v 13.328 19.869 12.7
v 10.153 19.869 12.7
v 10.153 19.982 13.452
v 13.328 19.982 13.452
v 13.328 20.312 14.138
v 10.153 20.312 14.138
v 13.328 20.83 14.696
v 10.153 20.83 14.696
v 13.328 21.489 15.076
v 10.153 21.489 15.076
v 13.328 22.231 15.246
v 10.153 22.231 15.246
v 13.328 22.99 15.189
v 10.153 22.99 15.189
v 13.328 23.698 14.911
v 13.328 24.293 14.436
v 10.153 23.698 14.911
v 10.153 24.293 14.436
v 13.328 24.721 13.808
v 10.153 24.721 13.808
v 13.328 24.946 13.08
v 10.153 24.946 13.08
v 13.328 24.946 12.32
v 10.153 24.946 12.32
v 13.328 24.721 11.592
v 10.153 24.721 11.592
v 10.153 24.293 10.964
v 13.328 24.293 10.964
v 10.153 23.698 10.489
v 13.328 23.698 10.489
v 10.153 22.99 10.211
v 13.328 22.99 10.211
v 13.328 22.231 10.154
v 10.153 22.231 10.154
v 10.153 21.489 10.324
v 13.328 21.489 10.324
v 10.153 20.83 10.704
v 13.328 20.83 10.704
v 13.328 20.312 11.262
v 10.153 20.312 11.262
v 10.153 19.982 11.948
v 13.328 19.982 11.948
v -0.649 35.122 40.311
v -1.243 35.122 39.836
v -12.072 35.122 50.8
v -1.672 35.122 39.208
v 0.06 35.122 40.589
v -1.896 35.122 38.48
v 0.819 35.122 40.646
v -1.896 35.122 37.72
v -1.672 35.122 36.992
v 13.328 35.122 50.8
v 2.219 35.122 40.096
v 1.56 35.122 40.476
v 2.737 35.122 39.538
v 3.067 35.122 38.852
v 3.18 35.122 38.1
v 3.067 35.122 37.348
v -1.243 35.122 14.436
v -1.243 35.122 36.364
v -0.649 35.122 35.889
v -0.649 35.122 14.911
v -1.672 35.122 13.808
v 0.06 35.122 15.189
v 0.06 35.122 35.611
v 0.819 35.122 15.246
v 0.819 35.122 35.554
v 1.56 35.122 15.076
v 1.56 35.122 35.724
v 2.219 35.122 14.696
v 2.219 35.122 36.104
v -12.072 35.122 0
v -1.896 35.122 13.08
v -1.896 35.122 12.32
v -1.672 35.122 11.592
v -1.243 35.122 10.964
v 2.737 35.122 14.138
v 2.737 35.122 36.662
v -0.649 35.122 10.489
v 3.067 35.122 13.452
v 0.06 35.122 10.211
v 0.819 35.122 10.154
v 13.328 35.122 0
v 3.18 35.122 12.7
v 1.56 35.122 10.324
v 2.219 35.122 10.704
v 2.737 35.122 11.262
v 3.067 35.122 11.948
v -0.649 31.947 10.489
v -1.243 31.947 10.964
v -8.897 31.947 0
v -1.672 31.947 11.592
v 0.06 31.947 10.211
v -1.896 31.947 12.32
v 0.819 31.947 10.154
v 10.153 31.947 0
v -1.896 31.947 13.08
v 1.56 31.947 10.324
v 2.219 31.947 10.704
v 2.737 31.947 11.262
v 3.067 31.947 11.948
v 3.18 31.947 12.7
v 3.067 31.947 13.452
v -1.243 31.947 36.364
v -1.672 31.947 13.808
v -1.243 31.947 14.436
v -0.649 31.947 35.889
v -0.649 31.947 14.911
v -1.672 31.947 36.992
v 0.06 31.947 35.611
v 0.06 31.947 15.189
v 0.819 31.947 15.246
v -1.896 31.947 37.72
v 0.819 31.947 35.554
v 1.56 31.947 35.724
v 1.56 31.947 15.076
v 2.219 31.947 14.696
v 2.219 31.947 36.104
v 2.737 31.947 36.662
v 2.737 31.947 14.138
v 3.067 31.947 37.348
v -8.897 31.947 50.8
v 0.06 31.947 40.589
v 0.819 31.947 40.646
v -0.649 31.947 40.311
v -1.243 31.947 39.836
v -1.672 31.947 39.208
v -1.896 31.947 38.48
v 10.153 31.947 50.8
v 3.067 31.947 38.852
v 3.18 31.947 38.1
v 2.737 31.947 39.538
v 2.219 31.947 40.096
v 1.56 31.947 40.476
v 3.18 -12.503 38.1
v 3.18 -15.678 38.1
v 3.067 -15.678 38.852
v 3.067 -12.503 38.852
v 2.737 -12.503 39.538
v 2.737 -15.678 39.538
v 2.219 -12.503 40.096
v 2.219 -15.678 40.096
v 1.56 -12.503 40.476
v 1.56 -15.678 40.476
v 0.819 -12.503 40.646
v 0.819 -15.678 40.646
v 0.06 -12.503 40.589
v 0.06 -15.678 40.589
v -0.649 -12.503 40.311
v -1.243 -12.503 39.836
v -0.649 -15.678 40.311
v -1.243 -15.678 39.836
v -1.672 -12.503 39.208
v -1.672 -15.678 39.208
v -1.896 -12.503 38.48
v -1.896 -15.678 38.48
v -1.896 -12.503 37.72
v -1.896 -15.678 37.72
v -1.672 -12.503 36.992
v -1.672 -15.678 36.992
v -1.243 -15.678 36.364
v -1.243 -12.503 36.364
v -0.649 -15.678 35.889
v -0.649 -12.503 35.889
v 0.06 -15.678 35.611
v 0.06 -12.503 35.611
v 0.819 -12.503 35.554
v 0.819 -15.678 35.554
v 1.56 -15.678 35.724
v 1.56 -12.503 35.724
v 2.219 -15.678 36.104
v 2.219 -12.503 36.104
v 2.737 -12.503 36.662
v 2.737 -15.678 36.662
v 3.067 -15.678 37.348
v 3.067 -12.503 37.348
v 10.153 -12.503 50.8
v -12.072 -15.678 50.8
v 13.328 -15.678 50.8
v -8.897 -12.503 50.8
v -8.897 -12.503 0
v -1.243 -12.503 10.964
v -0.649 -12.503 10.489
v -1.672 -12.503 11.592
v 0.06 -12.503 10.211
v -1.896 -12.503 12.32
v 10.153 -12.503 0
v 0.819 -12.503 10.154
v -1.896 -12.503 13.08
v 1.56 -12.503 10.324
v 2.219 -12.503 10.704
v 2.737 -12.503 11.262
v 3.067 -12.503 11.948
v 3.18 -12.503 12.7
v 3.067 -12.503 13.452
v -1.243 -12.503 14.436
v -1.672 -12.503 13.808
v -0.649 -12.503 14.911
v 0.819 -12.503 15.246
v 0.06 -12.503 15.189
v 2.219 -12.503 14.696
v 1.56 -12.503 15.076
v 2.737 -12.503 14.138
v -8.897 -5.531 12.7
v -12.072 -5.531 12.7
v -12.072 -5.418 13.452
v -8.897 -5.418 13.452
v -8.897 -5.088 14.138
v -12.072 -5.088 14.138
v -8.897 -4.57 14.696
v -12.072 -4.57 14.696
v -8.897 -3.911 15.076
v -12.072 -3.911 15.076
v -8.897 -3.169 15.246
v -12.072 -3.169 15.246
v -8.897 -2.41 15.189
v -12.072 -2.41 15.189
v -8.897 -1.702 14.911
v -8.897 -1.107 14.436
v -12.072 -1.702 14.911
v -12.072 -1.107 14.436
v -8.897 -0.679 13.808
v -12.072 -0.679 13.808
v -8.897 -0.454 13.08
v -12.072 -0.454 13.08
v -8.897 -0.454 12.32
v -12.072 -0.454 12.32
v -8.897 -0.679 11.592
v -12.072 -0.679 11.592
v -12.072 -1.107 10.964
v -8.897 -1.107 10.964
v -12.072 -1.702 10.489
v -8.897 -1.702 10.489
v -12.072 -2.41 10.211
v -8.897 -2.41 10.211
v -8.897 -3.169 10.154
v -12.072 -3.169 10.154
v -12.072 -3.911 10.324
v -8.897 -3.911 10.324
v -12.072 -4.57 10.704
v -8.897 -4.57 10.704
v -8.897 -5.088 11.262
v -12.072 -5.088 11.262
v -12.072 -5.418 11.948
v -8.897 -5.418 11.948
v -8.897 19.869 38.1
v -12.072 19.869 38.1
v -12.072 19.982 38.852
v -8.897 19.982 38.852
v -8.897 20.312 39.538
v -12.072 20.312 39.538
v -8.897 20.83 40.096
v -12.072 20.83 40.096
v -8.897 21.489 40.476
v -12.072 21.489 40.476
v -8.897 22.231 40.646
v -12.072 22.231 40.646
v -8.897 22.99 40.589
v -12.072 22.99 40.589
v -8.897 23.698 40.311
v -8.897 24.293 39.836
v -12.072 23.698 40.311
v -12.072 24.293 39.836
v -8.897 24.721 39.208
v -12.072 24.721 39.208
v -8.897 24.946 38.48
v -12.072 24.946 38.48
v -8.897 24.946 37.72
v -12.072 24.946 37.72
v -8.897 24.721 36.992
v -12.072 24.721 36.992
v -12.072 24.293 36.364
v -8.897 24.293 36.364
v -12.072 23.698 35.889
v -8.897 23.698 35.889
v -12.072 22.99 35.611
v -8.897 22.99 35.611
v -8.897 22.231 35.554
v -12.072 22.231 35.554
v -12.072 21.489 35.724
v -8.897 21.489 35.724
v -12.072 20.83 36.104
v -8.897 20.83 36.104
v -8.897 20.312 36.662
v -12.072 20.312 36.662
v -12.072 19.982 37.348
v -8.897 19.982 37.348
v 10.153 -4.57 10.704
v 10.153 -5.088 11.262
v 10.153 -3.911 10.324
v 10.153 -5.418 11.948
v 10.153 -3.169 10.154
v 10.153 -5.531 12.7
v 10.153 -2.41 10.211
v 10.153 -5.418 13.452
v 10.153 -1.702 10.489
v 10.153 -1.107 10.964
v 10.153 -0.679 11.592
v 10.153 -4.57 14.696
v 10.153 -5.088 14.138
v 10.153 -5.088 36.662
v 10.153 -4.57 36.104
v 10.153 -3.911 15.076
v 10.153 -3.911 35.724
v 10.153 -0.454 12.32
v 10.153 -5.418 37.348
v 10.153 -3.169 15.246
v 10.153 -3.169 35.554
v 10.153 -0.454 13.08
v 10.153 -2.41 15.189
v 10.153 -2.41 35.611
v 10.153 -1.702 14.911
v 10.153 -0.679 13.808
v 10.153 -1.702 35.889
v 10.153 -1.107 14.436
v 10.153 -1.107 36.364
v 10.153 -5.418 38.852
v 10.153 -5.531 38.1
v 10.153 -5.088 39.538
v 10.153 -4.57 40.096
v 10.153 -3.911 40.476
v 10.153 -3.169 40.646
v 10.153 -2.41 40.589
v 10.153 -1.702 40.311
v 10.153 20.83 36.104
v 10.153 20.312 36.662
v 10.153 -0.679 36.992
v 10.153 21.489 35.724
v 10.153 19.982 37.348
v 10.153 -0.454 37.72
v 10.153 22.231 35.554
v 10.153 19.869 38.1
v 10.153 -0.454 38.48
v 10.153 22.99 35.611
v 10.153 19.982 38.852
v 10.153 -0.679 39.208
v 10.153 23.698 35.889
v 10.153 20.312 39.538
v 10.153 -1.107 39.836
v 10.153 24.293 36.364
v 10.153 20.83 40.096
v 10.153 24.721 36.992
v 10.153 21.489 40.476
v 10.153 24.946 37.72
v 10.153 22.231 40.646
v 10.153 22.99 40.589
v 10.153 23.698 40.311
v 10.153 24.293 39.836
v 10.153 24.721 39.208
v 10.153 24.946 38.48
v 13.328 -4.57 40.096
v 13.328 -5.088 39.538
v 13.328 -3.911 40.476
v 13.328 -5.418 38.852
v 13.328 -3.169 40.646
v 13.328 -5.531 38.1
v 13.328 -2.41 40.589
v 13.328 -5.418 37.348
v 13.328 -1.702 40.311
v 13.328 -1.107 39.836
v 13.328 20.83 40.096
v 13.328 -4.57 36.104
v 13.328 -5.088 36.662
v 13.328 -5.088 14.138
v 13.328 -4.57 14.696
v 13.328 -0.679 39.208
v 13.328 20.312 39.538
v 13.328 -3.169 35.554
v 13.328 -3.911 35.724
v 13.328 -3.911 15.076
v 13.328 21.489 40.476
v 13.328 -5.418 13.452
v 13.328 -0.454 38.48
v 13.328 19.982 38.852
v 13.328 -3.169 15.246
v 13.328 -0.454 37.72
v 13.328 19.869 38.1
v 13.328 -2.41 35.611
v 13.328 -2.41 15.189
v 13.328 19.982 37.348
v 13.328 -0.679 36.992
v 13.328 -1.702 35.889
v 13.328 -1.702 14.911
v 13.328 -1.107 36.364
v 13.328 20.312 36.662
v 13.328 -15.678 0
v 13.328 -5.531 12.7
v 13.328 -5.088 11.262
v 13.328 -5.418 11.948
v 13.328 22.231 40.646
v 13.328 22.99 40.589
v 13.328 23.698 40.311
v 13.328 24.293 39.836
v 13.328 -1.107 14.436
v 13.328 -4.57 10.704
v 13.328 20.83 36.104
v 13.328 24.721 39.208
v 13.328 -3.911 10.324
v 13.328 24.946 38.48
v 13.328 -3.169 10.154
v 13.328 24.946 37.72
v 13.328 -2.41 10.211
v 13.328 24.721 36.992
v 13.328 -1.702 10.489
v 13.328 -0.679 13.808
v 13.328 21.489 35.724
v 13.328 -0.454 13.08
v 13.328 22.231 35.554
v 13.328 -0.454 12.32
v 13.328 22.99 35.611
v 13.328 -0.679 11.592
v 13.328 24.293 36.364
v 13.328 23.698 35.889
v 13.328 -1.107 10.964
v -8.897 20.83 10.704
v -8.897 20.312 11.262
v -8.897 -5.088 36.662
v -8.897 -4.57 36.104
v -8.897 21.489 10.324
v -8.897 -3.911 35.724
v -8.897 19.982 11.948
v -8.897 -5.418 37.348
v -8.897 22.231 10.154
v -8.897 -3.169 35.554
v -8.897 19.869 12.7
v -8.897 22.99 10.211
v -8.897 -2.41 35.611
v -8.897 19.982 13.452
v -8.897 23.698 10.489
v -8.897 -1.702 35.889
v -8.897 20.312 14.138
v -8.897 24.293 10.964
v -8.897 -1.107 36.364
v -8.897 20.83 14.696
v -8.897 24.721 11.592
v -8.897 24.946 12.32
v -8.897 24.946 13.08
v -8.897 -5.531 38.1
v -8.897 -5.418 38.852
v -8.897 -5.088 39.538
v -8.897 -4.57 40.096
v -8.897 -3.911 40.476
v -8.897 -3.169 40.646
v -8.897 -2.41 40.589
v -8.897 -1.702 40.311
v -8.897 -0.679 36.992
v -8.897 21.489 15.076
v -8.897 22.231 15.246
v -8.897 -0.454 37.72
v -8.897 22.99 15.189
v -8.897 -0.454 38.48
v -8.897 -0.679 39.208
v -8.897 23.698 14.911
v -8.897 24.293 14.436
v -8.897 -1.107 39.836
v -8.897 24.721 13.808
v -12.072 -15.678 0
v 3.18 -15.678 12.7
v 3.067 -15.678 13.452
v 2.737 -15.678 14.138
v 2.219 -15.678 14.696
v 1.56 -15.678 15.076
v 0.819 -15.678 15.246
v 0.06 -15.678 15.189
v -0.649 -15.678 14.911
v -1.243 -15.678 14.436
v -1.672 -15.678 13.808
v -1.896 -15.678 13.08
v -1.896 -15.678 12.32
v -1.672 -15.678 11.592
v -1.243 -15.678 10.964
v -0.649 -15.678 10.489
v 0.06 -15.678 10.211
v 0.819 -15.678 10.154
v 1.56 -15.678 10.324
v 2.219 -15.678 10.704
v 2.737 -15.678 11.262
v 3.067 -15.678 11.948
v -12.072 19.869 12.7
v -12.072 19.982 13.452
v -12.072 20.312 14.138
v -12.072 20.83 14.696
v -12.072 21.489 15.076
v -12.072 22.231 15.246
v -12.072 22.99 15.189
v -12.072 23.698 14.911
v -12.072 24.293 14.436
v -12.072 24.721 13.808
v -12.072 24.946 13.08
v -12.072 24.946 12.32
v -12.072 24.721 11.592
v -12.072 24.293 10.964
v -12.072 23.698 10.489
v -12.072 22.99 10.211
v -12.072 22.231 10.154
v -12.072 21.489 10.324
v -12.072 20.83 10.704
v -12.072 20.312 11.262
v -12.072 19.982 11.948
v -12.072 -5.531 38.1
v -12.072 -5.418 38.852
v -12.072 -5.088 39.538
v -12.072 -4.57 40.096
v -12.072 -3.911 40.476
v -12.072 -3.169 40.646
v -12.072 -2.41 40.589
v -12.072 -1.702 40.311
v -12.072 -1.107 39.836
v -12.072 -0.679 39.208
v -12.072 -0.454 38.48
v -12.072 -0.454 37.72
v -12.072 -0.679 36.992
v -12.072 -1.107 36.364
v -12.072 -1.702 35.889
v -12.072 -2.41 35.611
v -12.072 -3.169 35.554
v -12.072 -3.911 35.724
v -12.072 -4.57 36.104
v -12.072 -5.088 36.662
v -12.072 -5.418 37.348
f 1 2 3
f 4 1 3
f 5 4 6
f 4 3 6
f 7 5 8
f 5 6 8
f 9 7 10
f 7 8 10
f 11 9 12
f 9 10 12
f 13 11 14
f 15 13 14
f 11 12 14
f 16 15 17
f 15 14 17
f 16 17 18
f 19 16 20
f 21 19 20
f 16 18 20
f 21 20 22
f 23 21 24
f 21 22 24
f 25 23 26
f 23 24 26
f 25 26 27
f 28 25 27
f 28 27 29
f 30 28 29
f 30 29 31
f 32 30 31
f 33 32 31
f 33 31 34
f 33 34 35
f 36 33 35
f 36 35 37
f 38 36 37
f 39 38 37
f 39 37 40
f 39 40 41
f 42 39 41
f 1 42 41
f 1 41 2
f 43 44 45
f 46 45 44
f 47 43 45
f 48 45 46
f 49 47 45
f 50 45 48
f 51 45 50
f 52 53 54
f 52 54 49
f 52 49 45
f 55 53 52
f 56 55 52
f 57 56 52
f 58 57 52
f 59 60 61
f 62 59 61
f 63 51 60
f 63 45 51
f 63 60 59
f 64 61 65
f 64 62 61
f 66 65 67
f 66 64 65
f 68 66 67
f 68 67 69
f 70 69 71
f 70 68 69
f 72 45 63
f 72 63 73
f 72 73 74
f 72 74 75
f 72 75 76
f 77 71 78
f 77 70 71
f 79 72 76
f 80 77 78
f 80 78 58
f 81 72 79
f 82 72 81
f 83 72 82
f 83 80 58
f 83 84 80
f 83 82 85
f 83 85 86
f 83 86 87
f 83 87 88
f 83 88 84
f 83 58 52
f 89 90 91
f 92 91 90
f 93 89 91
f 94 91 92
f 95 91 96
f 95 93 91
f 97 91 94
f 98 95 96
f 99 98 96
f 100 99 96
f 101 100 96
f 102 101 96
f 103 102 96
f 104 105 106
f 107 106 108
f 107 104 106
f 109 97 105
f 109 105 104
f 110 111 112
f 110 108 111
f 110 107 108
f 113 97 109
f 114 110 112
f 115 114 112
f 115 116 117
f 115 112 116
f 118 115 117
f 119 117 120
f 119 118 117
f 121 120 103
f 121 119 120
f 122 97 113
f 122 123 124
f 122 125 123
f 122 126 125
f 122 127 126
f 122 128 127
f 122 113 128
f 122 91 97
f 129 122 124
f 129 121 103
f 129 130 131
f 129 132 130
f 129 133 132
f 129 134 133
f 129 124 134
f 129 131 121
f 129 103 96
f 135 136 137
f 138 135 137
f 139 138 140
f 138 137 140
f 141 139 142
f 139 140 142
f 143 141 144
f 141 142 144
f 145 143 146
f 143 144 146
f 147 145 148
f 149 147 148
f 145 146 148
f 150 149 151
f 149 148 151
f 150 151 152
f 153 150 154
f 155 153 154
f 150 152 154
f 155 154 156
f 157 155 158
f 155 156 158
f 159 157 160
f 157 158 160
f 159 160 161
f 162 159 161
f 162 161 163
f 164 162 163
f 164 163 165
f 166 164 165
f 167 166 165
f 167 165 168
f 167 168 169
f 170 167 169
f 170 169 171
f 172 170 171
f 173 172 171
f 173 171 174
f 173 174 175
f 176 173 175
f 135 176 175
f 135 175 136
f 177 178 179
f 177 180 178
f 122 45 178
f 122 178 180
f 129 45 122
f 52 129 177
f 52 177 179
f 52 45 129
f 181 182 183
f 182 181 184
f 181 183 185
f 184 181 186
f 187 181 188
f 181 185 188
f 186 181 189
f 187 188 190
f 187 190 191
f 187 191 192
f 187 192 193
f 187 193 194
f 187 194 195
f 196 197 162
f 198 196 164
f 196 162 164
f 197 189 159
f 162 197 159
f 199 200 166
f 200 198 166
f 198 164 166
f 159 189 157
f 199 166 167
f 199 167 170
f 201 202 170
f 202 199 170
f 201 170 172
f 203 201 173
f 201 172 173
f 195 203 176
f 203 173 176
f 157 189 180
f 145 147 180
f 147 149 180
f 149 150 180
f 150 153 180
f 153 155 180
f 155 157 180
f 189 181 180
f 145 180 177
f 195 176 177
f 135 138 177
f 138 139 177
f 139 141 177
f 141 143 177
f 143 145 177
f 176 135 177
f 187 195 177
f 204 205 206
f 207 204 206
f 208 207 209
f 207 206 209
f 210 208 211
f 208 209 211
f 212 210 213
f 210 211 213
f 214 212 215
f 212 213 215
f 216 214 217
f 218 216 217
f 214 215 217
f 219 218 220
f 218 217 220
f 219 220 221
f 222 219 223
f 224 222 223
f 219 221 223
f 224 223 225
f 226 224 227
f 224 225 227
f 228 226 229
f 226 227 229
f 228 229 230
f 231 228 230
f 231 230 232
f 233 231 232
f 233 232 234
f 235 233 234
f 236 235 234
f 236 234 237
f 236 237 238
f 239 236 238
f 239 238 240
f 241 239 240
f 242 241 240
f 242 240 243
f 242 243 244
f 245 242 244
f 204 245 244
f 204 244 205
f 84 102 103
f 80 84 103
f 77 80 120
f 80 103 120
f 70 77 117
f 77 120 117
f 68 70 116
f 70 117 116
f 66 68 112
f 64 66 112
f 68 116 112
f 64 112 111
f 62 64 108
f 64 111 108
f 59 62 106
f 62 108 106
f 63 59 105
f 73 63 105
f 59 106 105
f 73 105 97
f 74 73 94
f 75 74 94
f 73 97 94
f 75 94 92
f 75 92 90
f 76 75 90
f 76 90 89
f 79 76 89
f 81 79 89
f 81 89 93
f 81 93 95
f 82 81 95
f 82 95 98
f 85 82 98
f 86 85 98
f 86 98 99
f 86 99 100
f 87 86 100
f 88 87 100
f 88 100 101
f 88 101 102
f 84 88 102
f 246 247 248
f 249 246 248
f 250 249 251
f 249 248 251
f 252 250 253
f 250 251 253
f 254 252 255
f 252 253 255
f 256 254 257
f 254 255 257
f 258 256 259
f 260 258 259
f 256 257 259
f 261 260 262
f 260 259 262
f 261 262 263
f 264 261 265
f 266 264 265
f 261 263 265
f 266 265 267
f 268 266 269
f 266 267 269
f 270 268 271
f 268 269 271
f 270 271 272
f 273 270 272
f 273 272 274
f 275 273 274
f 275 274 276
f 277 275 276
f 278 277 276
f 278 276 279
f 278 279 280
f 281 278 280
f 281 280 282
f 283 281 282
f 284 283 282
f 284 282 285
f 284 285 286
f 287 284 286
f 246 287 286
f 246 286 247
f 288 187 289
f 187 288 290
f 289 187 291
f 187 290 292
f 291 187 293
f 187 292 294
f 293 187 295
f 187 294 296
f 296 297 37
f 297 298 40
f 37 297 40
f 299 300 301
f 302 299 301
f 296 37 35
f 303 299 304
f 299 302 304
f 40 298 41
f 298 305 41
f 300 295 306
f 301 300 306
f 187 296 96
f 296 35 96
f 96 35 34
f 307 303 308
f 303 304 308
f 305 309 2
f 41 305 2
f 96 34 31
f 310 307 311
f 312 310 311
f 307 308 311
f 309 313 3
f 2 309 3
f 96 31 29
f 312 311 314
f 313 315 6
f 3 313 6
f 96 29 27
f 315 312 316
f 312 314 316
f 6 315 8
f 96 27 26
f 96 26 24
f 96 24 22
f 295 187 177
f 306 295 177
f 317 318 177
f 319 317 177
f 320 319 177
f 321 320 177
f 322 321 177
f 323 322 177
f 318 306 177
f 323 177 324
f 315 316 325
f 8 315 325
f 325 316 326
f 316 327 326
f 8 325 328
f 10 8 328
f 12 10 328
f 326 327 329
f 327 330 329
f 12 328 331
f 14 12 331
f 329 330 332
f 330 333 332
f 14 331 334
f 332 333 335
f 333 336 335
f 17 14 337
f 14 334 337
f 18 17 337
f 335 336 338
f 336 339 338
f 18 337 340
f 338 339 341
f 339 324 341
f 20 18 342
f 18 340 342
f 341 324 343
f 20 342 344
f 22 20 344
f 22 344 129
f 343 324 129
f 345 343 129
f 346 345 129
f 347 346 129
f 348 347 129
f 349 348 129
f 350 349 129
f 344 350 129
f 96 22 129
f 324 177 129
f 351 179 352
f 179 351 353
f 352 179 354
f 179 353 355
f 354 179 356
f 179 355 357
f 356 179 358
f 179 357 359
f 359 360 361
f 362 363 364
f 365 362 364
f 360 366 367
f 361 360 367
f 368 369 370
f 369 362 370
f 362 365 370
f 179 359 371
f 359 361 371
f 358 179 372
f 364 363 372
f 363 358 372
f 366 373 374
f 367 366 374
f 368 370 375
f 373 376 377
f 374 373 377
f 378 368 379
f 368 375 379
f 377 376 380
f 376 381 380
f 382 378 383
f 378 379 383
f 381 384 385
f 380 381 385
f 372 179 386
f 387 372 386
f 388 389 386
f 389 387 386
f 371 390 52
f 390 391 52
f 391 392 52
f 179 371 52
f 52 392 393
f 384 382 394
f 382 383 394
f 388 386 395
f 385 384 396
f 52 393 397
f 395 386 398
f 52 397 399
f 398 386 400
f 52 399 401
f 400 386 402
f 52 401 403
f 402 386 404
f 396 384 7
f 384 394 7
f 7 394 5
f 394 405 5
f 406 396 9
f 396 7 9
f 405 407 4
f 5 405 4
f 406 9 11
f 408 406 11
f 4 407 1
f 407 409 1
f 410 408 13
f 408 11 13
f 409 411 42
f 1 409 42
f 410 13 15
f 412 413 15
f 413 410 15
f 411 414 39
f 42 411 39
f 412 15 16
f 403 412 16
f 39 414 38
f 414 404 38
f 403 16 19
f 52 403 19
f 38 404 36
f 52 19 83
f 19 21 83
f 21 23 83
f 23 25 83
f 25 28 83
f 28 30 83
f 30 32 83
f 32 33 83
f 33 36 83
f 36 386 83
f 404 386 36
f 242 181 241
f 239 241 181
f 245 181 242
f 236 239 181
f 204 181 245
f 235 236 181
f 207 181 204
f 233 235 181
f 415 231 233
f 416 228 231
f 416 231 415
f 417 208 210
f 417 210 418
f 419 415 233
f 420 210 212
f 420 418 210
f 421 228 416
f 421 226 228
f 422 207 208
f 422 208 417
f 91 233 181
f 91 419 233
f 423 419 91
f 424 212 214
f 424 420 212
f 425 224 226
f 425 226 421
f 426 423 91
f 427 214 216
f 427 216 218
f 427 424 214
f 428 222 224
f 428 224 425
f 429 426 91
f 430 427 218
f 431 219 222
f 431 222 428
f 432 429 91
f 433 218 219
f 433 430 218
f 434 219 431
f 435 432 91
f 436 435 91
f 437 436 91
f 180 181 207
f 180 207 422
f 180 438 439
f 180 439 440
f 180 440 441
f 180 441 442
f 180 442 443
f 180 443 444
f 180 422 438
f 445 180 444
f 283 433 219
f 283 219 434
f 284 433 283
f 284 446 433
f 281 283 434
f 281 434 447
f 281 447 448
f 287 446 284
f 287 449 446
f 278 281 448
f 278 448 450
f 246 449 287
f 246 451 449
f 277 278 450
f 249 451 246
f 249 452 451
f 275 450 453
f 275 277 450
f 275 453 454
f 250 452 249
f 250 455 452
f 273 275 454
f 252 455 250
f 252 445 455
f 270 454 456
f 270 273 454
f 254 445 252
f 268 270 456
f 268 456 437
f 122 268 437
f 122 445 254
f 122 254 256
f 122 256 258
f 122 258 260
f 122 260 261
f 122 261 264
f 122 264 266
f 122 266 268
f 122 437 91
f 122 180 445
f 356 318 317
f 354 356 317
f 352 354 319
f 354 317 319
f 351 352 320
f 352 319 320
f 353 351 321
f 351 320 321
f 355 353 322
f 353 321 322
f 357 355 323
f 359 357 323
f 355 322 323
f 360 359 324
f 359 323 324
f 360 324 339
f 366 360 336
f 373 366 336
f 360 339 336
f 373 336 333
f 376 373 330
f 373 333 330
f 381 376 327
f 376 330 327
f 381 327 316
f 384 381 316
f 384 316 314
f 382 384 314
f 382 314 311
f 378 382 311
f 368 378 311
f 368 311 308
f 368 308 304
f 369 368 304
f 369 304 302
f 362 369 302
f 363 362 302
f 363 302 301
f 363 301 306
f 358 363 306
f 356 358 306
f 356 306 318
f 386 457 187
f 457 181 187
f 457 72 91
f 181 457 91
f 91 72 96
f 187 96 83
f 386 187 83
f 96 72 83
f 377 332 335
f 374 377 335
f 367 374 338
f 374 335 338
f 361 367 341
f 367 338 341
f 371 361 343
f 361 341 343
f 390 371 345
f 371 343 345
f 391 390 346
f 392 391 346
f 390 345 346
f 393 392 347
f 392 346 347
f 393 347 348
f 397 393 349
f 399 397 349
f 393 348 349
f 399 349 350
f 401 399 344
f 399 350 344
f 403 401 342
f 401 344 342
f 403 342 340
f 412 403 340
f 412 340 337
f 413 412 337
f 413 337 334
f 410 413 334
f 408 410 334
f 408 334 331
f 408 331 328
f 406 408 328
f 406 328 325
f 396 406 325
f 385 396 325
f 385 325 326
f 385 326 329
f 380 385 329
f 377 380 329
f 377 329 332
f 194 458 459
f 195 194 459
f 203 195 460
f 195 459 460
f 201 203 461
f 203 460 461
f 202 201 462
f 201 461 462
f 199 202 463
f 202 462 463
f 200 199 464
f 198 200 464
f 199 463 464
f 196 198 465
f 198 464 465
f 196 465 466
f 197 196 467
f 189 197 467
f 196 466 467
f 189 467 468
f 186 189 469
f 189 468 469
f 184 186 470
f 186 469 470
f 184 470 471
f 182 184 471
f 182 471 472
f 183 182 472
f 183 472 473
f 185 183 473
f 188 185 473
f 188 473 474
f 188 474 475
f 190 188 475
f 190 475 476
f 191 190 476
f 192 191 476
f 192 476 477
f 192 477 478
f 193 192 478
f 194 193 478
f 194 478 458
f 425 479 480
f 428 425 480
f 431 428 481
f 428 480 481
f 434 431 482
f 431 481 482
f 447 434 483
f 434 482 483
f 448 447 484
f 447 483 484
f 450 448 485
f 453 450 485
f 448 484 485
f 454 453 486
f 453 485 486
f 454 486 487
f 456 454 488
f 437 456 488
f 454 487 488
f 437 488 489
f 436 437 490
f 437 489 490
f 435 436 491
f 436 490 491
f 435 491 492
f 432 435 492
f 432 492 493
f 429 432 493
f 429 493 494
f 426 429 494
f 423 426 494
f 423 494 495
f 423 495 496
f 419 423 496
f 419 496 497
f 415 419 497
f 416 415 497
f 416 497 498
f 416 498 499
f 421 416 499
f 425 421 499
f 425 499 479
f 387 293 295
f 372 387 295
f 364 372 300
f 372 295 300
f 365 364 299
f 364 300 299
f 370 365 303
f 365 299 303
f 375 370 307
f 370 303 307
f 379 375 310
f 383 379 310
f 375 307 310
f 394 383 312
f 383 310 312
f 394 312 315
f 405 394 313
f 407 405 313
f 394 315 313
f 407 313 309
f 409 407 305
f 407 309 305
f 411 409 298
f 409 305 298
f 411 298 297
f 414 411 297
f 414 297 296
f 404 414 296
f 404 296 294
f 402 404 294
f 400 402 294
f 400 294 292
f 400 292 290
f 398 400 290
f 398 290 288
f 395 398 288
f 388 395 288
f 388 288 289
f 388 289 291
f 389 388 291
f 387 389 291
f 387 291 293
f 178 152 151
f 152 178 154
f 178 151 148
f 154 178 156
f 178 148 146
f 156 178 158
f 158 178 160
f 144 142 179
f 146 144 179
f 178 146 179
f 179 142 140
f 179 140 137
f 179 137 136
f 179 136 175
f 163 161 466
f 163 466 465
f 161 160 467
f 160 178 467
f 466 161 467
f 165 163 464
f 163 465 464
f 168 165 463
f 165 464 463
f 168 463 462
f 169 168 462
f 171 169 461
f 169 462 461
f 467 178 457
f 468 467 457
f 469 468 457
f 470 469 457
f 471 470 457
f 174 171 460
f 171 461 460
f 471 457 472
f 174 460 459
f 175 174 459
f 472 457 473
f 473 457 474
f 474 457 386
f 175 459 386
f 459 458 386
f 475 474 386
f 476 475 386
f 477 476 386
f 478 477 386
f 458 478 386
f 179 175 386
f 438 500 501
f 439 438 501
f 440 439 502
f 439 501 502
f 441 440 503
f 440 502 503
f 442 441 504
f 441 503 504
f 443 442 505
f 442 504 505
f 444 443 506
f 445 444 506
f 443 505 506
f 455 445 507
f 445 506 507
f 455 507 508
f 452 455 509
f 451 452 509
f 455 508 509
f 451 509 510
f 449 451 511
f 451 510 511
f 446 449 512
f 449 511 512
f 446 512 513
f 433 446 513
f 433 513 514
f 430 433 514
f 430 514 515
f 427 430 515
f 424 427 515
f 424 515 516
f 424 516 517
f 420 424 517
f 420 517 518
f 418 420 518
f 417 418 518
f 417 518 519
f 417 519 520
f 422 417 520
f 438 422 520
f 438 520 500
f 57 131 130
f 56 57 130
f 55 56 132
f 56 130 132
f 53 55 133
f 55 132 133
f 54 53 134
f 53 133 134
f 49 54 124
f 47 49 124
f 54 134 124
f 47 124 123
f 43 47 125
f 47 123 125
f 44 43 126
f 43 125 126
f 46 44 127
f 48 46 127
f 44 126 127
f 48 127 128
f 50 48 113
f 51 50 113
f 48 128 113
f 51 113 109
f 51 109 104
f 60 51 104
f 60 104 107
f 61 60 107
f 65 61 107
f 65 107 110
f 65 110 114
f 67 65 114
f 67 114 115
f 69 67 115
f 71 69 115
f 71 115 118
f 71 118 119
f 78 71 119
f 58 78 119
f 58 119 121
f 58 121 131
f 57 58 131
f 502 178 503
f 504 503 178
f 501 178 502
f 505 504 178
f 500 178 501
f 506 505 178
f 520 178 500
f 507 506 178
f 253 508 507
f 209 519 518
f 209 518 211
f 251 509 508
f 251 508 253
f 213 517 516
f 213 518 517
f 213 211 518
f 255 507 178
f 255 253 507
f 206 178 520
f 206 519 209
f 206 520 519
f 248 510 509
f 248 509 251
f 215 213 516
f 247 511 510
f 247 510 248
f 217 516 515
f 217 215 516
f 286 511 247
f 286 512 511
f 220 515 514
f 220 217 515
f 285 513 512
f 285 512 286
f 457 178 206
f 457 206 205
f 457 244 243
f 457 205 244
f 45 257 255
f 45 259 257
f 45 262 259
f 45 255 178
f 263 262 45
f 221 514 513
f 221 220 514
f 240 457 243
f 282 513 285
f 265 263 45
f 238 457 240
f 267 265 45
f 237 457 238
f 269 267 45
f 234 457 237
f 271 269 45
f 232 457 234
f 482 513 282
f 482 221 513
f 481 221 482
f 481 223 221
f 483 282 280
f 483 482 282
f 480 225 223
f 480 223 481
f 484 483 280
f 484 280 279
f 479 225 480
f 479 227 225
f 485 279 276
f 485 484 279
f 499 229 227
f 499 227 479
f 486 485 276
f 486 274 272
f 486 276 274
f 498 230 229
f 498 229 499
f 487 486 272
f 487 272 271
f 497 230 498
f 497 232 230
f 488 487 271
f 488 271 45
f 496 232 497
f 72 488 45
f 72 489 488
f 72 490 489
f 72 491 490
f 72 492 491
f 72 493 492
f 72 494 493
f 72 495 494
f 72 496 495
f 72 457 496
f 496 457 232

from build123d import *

# Parameters (mm, degrees)
F0_W     = 25.4
F0_H     = 50.8
F1_DEPTH = 50.8
F2_W     = 19.05
F2_H     = 44.45
F3_DEPTH = 50.8
F5_D     = 5.1054
F7_D     = 5.1054


with BuildPart() as f1:
    # F0 (on Top) → F1 (new body)
    with BuildSketch(Plane.XY):
        with Locations((0.627795, 9.72153)):
            Rectangle(F0_W, F0_H)
    extrude(amount=F1_DEPTH)

    # F2 (on face) → F3 (cut)
    with BuildSketch(Plane.XY.offset(50.8)):
        with Locations((0.627795, 9.72153)):
            Rectangle(F2_W, F2_H)
    extrude(amount=-F3_DEPTH, mode=Mode.SUBTRACT)

    # F5 (through all)
    with Locations(Plane.YZ.offset(13.327795)):
        with Locations((-2.97847, 38.1), (-2.97847, 12.7), (22.42153, 38.1), (22.42153, 12.7)):
            Hole(F5_D / 2)

    # F7 (through all)
    with Locations(Plane(origin=(0, 35.12153, 0), x_dir=(-1, 0, 0), z_dir=(0, 1, 0))):
        with Locations((-0.627795, 38.1), (-0.627795, 12.7)):
            Hole(F7_D / 2)


solid = f1.part
